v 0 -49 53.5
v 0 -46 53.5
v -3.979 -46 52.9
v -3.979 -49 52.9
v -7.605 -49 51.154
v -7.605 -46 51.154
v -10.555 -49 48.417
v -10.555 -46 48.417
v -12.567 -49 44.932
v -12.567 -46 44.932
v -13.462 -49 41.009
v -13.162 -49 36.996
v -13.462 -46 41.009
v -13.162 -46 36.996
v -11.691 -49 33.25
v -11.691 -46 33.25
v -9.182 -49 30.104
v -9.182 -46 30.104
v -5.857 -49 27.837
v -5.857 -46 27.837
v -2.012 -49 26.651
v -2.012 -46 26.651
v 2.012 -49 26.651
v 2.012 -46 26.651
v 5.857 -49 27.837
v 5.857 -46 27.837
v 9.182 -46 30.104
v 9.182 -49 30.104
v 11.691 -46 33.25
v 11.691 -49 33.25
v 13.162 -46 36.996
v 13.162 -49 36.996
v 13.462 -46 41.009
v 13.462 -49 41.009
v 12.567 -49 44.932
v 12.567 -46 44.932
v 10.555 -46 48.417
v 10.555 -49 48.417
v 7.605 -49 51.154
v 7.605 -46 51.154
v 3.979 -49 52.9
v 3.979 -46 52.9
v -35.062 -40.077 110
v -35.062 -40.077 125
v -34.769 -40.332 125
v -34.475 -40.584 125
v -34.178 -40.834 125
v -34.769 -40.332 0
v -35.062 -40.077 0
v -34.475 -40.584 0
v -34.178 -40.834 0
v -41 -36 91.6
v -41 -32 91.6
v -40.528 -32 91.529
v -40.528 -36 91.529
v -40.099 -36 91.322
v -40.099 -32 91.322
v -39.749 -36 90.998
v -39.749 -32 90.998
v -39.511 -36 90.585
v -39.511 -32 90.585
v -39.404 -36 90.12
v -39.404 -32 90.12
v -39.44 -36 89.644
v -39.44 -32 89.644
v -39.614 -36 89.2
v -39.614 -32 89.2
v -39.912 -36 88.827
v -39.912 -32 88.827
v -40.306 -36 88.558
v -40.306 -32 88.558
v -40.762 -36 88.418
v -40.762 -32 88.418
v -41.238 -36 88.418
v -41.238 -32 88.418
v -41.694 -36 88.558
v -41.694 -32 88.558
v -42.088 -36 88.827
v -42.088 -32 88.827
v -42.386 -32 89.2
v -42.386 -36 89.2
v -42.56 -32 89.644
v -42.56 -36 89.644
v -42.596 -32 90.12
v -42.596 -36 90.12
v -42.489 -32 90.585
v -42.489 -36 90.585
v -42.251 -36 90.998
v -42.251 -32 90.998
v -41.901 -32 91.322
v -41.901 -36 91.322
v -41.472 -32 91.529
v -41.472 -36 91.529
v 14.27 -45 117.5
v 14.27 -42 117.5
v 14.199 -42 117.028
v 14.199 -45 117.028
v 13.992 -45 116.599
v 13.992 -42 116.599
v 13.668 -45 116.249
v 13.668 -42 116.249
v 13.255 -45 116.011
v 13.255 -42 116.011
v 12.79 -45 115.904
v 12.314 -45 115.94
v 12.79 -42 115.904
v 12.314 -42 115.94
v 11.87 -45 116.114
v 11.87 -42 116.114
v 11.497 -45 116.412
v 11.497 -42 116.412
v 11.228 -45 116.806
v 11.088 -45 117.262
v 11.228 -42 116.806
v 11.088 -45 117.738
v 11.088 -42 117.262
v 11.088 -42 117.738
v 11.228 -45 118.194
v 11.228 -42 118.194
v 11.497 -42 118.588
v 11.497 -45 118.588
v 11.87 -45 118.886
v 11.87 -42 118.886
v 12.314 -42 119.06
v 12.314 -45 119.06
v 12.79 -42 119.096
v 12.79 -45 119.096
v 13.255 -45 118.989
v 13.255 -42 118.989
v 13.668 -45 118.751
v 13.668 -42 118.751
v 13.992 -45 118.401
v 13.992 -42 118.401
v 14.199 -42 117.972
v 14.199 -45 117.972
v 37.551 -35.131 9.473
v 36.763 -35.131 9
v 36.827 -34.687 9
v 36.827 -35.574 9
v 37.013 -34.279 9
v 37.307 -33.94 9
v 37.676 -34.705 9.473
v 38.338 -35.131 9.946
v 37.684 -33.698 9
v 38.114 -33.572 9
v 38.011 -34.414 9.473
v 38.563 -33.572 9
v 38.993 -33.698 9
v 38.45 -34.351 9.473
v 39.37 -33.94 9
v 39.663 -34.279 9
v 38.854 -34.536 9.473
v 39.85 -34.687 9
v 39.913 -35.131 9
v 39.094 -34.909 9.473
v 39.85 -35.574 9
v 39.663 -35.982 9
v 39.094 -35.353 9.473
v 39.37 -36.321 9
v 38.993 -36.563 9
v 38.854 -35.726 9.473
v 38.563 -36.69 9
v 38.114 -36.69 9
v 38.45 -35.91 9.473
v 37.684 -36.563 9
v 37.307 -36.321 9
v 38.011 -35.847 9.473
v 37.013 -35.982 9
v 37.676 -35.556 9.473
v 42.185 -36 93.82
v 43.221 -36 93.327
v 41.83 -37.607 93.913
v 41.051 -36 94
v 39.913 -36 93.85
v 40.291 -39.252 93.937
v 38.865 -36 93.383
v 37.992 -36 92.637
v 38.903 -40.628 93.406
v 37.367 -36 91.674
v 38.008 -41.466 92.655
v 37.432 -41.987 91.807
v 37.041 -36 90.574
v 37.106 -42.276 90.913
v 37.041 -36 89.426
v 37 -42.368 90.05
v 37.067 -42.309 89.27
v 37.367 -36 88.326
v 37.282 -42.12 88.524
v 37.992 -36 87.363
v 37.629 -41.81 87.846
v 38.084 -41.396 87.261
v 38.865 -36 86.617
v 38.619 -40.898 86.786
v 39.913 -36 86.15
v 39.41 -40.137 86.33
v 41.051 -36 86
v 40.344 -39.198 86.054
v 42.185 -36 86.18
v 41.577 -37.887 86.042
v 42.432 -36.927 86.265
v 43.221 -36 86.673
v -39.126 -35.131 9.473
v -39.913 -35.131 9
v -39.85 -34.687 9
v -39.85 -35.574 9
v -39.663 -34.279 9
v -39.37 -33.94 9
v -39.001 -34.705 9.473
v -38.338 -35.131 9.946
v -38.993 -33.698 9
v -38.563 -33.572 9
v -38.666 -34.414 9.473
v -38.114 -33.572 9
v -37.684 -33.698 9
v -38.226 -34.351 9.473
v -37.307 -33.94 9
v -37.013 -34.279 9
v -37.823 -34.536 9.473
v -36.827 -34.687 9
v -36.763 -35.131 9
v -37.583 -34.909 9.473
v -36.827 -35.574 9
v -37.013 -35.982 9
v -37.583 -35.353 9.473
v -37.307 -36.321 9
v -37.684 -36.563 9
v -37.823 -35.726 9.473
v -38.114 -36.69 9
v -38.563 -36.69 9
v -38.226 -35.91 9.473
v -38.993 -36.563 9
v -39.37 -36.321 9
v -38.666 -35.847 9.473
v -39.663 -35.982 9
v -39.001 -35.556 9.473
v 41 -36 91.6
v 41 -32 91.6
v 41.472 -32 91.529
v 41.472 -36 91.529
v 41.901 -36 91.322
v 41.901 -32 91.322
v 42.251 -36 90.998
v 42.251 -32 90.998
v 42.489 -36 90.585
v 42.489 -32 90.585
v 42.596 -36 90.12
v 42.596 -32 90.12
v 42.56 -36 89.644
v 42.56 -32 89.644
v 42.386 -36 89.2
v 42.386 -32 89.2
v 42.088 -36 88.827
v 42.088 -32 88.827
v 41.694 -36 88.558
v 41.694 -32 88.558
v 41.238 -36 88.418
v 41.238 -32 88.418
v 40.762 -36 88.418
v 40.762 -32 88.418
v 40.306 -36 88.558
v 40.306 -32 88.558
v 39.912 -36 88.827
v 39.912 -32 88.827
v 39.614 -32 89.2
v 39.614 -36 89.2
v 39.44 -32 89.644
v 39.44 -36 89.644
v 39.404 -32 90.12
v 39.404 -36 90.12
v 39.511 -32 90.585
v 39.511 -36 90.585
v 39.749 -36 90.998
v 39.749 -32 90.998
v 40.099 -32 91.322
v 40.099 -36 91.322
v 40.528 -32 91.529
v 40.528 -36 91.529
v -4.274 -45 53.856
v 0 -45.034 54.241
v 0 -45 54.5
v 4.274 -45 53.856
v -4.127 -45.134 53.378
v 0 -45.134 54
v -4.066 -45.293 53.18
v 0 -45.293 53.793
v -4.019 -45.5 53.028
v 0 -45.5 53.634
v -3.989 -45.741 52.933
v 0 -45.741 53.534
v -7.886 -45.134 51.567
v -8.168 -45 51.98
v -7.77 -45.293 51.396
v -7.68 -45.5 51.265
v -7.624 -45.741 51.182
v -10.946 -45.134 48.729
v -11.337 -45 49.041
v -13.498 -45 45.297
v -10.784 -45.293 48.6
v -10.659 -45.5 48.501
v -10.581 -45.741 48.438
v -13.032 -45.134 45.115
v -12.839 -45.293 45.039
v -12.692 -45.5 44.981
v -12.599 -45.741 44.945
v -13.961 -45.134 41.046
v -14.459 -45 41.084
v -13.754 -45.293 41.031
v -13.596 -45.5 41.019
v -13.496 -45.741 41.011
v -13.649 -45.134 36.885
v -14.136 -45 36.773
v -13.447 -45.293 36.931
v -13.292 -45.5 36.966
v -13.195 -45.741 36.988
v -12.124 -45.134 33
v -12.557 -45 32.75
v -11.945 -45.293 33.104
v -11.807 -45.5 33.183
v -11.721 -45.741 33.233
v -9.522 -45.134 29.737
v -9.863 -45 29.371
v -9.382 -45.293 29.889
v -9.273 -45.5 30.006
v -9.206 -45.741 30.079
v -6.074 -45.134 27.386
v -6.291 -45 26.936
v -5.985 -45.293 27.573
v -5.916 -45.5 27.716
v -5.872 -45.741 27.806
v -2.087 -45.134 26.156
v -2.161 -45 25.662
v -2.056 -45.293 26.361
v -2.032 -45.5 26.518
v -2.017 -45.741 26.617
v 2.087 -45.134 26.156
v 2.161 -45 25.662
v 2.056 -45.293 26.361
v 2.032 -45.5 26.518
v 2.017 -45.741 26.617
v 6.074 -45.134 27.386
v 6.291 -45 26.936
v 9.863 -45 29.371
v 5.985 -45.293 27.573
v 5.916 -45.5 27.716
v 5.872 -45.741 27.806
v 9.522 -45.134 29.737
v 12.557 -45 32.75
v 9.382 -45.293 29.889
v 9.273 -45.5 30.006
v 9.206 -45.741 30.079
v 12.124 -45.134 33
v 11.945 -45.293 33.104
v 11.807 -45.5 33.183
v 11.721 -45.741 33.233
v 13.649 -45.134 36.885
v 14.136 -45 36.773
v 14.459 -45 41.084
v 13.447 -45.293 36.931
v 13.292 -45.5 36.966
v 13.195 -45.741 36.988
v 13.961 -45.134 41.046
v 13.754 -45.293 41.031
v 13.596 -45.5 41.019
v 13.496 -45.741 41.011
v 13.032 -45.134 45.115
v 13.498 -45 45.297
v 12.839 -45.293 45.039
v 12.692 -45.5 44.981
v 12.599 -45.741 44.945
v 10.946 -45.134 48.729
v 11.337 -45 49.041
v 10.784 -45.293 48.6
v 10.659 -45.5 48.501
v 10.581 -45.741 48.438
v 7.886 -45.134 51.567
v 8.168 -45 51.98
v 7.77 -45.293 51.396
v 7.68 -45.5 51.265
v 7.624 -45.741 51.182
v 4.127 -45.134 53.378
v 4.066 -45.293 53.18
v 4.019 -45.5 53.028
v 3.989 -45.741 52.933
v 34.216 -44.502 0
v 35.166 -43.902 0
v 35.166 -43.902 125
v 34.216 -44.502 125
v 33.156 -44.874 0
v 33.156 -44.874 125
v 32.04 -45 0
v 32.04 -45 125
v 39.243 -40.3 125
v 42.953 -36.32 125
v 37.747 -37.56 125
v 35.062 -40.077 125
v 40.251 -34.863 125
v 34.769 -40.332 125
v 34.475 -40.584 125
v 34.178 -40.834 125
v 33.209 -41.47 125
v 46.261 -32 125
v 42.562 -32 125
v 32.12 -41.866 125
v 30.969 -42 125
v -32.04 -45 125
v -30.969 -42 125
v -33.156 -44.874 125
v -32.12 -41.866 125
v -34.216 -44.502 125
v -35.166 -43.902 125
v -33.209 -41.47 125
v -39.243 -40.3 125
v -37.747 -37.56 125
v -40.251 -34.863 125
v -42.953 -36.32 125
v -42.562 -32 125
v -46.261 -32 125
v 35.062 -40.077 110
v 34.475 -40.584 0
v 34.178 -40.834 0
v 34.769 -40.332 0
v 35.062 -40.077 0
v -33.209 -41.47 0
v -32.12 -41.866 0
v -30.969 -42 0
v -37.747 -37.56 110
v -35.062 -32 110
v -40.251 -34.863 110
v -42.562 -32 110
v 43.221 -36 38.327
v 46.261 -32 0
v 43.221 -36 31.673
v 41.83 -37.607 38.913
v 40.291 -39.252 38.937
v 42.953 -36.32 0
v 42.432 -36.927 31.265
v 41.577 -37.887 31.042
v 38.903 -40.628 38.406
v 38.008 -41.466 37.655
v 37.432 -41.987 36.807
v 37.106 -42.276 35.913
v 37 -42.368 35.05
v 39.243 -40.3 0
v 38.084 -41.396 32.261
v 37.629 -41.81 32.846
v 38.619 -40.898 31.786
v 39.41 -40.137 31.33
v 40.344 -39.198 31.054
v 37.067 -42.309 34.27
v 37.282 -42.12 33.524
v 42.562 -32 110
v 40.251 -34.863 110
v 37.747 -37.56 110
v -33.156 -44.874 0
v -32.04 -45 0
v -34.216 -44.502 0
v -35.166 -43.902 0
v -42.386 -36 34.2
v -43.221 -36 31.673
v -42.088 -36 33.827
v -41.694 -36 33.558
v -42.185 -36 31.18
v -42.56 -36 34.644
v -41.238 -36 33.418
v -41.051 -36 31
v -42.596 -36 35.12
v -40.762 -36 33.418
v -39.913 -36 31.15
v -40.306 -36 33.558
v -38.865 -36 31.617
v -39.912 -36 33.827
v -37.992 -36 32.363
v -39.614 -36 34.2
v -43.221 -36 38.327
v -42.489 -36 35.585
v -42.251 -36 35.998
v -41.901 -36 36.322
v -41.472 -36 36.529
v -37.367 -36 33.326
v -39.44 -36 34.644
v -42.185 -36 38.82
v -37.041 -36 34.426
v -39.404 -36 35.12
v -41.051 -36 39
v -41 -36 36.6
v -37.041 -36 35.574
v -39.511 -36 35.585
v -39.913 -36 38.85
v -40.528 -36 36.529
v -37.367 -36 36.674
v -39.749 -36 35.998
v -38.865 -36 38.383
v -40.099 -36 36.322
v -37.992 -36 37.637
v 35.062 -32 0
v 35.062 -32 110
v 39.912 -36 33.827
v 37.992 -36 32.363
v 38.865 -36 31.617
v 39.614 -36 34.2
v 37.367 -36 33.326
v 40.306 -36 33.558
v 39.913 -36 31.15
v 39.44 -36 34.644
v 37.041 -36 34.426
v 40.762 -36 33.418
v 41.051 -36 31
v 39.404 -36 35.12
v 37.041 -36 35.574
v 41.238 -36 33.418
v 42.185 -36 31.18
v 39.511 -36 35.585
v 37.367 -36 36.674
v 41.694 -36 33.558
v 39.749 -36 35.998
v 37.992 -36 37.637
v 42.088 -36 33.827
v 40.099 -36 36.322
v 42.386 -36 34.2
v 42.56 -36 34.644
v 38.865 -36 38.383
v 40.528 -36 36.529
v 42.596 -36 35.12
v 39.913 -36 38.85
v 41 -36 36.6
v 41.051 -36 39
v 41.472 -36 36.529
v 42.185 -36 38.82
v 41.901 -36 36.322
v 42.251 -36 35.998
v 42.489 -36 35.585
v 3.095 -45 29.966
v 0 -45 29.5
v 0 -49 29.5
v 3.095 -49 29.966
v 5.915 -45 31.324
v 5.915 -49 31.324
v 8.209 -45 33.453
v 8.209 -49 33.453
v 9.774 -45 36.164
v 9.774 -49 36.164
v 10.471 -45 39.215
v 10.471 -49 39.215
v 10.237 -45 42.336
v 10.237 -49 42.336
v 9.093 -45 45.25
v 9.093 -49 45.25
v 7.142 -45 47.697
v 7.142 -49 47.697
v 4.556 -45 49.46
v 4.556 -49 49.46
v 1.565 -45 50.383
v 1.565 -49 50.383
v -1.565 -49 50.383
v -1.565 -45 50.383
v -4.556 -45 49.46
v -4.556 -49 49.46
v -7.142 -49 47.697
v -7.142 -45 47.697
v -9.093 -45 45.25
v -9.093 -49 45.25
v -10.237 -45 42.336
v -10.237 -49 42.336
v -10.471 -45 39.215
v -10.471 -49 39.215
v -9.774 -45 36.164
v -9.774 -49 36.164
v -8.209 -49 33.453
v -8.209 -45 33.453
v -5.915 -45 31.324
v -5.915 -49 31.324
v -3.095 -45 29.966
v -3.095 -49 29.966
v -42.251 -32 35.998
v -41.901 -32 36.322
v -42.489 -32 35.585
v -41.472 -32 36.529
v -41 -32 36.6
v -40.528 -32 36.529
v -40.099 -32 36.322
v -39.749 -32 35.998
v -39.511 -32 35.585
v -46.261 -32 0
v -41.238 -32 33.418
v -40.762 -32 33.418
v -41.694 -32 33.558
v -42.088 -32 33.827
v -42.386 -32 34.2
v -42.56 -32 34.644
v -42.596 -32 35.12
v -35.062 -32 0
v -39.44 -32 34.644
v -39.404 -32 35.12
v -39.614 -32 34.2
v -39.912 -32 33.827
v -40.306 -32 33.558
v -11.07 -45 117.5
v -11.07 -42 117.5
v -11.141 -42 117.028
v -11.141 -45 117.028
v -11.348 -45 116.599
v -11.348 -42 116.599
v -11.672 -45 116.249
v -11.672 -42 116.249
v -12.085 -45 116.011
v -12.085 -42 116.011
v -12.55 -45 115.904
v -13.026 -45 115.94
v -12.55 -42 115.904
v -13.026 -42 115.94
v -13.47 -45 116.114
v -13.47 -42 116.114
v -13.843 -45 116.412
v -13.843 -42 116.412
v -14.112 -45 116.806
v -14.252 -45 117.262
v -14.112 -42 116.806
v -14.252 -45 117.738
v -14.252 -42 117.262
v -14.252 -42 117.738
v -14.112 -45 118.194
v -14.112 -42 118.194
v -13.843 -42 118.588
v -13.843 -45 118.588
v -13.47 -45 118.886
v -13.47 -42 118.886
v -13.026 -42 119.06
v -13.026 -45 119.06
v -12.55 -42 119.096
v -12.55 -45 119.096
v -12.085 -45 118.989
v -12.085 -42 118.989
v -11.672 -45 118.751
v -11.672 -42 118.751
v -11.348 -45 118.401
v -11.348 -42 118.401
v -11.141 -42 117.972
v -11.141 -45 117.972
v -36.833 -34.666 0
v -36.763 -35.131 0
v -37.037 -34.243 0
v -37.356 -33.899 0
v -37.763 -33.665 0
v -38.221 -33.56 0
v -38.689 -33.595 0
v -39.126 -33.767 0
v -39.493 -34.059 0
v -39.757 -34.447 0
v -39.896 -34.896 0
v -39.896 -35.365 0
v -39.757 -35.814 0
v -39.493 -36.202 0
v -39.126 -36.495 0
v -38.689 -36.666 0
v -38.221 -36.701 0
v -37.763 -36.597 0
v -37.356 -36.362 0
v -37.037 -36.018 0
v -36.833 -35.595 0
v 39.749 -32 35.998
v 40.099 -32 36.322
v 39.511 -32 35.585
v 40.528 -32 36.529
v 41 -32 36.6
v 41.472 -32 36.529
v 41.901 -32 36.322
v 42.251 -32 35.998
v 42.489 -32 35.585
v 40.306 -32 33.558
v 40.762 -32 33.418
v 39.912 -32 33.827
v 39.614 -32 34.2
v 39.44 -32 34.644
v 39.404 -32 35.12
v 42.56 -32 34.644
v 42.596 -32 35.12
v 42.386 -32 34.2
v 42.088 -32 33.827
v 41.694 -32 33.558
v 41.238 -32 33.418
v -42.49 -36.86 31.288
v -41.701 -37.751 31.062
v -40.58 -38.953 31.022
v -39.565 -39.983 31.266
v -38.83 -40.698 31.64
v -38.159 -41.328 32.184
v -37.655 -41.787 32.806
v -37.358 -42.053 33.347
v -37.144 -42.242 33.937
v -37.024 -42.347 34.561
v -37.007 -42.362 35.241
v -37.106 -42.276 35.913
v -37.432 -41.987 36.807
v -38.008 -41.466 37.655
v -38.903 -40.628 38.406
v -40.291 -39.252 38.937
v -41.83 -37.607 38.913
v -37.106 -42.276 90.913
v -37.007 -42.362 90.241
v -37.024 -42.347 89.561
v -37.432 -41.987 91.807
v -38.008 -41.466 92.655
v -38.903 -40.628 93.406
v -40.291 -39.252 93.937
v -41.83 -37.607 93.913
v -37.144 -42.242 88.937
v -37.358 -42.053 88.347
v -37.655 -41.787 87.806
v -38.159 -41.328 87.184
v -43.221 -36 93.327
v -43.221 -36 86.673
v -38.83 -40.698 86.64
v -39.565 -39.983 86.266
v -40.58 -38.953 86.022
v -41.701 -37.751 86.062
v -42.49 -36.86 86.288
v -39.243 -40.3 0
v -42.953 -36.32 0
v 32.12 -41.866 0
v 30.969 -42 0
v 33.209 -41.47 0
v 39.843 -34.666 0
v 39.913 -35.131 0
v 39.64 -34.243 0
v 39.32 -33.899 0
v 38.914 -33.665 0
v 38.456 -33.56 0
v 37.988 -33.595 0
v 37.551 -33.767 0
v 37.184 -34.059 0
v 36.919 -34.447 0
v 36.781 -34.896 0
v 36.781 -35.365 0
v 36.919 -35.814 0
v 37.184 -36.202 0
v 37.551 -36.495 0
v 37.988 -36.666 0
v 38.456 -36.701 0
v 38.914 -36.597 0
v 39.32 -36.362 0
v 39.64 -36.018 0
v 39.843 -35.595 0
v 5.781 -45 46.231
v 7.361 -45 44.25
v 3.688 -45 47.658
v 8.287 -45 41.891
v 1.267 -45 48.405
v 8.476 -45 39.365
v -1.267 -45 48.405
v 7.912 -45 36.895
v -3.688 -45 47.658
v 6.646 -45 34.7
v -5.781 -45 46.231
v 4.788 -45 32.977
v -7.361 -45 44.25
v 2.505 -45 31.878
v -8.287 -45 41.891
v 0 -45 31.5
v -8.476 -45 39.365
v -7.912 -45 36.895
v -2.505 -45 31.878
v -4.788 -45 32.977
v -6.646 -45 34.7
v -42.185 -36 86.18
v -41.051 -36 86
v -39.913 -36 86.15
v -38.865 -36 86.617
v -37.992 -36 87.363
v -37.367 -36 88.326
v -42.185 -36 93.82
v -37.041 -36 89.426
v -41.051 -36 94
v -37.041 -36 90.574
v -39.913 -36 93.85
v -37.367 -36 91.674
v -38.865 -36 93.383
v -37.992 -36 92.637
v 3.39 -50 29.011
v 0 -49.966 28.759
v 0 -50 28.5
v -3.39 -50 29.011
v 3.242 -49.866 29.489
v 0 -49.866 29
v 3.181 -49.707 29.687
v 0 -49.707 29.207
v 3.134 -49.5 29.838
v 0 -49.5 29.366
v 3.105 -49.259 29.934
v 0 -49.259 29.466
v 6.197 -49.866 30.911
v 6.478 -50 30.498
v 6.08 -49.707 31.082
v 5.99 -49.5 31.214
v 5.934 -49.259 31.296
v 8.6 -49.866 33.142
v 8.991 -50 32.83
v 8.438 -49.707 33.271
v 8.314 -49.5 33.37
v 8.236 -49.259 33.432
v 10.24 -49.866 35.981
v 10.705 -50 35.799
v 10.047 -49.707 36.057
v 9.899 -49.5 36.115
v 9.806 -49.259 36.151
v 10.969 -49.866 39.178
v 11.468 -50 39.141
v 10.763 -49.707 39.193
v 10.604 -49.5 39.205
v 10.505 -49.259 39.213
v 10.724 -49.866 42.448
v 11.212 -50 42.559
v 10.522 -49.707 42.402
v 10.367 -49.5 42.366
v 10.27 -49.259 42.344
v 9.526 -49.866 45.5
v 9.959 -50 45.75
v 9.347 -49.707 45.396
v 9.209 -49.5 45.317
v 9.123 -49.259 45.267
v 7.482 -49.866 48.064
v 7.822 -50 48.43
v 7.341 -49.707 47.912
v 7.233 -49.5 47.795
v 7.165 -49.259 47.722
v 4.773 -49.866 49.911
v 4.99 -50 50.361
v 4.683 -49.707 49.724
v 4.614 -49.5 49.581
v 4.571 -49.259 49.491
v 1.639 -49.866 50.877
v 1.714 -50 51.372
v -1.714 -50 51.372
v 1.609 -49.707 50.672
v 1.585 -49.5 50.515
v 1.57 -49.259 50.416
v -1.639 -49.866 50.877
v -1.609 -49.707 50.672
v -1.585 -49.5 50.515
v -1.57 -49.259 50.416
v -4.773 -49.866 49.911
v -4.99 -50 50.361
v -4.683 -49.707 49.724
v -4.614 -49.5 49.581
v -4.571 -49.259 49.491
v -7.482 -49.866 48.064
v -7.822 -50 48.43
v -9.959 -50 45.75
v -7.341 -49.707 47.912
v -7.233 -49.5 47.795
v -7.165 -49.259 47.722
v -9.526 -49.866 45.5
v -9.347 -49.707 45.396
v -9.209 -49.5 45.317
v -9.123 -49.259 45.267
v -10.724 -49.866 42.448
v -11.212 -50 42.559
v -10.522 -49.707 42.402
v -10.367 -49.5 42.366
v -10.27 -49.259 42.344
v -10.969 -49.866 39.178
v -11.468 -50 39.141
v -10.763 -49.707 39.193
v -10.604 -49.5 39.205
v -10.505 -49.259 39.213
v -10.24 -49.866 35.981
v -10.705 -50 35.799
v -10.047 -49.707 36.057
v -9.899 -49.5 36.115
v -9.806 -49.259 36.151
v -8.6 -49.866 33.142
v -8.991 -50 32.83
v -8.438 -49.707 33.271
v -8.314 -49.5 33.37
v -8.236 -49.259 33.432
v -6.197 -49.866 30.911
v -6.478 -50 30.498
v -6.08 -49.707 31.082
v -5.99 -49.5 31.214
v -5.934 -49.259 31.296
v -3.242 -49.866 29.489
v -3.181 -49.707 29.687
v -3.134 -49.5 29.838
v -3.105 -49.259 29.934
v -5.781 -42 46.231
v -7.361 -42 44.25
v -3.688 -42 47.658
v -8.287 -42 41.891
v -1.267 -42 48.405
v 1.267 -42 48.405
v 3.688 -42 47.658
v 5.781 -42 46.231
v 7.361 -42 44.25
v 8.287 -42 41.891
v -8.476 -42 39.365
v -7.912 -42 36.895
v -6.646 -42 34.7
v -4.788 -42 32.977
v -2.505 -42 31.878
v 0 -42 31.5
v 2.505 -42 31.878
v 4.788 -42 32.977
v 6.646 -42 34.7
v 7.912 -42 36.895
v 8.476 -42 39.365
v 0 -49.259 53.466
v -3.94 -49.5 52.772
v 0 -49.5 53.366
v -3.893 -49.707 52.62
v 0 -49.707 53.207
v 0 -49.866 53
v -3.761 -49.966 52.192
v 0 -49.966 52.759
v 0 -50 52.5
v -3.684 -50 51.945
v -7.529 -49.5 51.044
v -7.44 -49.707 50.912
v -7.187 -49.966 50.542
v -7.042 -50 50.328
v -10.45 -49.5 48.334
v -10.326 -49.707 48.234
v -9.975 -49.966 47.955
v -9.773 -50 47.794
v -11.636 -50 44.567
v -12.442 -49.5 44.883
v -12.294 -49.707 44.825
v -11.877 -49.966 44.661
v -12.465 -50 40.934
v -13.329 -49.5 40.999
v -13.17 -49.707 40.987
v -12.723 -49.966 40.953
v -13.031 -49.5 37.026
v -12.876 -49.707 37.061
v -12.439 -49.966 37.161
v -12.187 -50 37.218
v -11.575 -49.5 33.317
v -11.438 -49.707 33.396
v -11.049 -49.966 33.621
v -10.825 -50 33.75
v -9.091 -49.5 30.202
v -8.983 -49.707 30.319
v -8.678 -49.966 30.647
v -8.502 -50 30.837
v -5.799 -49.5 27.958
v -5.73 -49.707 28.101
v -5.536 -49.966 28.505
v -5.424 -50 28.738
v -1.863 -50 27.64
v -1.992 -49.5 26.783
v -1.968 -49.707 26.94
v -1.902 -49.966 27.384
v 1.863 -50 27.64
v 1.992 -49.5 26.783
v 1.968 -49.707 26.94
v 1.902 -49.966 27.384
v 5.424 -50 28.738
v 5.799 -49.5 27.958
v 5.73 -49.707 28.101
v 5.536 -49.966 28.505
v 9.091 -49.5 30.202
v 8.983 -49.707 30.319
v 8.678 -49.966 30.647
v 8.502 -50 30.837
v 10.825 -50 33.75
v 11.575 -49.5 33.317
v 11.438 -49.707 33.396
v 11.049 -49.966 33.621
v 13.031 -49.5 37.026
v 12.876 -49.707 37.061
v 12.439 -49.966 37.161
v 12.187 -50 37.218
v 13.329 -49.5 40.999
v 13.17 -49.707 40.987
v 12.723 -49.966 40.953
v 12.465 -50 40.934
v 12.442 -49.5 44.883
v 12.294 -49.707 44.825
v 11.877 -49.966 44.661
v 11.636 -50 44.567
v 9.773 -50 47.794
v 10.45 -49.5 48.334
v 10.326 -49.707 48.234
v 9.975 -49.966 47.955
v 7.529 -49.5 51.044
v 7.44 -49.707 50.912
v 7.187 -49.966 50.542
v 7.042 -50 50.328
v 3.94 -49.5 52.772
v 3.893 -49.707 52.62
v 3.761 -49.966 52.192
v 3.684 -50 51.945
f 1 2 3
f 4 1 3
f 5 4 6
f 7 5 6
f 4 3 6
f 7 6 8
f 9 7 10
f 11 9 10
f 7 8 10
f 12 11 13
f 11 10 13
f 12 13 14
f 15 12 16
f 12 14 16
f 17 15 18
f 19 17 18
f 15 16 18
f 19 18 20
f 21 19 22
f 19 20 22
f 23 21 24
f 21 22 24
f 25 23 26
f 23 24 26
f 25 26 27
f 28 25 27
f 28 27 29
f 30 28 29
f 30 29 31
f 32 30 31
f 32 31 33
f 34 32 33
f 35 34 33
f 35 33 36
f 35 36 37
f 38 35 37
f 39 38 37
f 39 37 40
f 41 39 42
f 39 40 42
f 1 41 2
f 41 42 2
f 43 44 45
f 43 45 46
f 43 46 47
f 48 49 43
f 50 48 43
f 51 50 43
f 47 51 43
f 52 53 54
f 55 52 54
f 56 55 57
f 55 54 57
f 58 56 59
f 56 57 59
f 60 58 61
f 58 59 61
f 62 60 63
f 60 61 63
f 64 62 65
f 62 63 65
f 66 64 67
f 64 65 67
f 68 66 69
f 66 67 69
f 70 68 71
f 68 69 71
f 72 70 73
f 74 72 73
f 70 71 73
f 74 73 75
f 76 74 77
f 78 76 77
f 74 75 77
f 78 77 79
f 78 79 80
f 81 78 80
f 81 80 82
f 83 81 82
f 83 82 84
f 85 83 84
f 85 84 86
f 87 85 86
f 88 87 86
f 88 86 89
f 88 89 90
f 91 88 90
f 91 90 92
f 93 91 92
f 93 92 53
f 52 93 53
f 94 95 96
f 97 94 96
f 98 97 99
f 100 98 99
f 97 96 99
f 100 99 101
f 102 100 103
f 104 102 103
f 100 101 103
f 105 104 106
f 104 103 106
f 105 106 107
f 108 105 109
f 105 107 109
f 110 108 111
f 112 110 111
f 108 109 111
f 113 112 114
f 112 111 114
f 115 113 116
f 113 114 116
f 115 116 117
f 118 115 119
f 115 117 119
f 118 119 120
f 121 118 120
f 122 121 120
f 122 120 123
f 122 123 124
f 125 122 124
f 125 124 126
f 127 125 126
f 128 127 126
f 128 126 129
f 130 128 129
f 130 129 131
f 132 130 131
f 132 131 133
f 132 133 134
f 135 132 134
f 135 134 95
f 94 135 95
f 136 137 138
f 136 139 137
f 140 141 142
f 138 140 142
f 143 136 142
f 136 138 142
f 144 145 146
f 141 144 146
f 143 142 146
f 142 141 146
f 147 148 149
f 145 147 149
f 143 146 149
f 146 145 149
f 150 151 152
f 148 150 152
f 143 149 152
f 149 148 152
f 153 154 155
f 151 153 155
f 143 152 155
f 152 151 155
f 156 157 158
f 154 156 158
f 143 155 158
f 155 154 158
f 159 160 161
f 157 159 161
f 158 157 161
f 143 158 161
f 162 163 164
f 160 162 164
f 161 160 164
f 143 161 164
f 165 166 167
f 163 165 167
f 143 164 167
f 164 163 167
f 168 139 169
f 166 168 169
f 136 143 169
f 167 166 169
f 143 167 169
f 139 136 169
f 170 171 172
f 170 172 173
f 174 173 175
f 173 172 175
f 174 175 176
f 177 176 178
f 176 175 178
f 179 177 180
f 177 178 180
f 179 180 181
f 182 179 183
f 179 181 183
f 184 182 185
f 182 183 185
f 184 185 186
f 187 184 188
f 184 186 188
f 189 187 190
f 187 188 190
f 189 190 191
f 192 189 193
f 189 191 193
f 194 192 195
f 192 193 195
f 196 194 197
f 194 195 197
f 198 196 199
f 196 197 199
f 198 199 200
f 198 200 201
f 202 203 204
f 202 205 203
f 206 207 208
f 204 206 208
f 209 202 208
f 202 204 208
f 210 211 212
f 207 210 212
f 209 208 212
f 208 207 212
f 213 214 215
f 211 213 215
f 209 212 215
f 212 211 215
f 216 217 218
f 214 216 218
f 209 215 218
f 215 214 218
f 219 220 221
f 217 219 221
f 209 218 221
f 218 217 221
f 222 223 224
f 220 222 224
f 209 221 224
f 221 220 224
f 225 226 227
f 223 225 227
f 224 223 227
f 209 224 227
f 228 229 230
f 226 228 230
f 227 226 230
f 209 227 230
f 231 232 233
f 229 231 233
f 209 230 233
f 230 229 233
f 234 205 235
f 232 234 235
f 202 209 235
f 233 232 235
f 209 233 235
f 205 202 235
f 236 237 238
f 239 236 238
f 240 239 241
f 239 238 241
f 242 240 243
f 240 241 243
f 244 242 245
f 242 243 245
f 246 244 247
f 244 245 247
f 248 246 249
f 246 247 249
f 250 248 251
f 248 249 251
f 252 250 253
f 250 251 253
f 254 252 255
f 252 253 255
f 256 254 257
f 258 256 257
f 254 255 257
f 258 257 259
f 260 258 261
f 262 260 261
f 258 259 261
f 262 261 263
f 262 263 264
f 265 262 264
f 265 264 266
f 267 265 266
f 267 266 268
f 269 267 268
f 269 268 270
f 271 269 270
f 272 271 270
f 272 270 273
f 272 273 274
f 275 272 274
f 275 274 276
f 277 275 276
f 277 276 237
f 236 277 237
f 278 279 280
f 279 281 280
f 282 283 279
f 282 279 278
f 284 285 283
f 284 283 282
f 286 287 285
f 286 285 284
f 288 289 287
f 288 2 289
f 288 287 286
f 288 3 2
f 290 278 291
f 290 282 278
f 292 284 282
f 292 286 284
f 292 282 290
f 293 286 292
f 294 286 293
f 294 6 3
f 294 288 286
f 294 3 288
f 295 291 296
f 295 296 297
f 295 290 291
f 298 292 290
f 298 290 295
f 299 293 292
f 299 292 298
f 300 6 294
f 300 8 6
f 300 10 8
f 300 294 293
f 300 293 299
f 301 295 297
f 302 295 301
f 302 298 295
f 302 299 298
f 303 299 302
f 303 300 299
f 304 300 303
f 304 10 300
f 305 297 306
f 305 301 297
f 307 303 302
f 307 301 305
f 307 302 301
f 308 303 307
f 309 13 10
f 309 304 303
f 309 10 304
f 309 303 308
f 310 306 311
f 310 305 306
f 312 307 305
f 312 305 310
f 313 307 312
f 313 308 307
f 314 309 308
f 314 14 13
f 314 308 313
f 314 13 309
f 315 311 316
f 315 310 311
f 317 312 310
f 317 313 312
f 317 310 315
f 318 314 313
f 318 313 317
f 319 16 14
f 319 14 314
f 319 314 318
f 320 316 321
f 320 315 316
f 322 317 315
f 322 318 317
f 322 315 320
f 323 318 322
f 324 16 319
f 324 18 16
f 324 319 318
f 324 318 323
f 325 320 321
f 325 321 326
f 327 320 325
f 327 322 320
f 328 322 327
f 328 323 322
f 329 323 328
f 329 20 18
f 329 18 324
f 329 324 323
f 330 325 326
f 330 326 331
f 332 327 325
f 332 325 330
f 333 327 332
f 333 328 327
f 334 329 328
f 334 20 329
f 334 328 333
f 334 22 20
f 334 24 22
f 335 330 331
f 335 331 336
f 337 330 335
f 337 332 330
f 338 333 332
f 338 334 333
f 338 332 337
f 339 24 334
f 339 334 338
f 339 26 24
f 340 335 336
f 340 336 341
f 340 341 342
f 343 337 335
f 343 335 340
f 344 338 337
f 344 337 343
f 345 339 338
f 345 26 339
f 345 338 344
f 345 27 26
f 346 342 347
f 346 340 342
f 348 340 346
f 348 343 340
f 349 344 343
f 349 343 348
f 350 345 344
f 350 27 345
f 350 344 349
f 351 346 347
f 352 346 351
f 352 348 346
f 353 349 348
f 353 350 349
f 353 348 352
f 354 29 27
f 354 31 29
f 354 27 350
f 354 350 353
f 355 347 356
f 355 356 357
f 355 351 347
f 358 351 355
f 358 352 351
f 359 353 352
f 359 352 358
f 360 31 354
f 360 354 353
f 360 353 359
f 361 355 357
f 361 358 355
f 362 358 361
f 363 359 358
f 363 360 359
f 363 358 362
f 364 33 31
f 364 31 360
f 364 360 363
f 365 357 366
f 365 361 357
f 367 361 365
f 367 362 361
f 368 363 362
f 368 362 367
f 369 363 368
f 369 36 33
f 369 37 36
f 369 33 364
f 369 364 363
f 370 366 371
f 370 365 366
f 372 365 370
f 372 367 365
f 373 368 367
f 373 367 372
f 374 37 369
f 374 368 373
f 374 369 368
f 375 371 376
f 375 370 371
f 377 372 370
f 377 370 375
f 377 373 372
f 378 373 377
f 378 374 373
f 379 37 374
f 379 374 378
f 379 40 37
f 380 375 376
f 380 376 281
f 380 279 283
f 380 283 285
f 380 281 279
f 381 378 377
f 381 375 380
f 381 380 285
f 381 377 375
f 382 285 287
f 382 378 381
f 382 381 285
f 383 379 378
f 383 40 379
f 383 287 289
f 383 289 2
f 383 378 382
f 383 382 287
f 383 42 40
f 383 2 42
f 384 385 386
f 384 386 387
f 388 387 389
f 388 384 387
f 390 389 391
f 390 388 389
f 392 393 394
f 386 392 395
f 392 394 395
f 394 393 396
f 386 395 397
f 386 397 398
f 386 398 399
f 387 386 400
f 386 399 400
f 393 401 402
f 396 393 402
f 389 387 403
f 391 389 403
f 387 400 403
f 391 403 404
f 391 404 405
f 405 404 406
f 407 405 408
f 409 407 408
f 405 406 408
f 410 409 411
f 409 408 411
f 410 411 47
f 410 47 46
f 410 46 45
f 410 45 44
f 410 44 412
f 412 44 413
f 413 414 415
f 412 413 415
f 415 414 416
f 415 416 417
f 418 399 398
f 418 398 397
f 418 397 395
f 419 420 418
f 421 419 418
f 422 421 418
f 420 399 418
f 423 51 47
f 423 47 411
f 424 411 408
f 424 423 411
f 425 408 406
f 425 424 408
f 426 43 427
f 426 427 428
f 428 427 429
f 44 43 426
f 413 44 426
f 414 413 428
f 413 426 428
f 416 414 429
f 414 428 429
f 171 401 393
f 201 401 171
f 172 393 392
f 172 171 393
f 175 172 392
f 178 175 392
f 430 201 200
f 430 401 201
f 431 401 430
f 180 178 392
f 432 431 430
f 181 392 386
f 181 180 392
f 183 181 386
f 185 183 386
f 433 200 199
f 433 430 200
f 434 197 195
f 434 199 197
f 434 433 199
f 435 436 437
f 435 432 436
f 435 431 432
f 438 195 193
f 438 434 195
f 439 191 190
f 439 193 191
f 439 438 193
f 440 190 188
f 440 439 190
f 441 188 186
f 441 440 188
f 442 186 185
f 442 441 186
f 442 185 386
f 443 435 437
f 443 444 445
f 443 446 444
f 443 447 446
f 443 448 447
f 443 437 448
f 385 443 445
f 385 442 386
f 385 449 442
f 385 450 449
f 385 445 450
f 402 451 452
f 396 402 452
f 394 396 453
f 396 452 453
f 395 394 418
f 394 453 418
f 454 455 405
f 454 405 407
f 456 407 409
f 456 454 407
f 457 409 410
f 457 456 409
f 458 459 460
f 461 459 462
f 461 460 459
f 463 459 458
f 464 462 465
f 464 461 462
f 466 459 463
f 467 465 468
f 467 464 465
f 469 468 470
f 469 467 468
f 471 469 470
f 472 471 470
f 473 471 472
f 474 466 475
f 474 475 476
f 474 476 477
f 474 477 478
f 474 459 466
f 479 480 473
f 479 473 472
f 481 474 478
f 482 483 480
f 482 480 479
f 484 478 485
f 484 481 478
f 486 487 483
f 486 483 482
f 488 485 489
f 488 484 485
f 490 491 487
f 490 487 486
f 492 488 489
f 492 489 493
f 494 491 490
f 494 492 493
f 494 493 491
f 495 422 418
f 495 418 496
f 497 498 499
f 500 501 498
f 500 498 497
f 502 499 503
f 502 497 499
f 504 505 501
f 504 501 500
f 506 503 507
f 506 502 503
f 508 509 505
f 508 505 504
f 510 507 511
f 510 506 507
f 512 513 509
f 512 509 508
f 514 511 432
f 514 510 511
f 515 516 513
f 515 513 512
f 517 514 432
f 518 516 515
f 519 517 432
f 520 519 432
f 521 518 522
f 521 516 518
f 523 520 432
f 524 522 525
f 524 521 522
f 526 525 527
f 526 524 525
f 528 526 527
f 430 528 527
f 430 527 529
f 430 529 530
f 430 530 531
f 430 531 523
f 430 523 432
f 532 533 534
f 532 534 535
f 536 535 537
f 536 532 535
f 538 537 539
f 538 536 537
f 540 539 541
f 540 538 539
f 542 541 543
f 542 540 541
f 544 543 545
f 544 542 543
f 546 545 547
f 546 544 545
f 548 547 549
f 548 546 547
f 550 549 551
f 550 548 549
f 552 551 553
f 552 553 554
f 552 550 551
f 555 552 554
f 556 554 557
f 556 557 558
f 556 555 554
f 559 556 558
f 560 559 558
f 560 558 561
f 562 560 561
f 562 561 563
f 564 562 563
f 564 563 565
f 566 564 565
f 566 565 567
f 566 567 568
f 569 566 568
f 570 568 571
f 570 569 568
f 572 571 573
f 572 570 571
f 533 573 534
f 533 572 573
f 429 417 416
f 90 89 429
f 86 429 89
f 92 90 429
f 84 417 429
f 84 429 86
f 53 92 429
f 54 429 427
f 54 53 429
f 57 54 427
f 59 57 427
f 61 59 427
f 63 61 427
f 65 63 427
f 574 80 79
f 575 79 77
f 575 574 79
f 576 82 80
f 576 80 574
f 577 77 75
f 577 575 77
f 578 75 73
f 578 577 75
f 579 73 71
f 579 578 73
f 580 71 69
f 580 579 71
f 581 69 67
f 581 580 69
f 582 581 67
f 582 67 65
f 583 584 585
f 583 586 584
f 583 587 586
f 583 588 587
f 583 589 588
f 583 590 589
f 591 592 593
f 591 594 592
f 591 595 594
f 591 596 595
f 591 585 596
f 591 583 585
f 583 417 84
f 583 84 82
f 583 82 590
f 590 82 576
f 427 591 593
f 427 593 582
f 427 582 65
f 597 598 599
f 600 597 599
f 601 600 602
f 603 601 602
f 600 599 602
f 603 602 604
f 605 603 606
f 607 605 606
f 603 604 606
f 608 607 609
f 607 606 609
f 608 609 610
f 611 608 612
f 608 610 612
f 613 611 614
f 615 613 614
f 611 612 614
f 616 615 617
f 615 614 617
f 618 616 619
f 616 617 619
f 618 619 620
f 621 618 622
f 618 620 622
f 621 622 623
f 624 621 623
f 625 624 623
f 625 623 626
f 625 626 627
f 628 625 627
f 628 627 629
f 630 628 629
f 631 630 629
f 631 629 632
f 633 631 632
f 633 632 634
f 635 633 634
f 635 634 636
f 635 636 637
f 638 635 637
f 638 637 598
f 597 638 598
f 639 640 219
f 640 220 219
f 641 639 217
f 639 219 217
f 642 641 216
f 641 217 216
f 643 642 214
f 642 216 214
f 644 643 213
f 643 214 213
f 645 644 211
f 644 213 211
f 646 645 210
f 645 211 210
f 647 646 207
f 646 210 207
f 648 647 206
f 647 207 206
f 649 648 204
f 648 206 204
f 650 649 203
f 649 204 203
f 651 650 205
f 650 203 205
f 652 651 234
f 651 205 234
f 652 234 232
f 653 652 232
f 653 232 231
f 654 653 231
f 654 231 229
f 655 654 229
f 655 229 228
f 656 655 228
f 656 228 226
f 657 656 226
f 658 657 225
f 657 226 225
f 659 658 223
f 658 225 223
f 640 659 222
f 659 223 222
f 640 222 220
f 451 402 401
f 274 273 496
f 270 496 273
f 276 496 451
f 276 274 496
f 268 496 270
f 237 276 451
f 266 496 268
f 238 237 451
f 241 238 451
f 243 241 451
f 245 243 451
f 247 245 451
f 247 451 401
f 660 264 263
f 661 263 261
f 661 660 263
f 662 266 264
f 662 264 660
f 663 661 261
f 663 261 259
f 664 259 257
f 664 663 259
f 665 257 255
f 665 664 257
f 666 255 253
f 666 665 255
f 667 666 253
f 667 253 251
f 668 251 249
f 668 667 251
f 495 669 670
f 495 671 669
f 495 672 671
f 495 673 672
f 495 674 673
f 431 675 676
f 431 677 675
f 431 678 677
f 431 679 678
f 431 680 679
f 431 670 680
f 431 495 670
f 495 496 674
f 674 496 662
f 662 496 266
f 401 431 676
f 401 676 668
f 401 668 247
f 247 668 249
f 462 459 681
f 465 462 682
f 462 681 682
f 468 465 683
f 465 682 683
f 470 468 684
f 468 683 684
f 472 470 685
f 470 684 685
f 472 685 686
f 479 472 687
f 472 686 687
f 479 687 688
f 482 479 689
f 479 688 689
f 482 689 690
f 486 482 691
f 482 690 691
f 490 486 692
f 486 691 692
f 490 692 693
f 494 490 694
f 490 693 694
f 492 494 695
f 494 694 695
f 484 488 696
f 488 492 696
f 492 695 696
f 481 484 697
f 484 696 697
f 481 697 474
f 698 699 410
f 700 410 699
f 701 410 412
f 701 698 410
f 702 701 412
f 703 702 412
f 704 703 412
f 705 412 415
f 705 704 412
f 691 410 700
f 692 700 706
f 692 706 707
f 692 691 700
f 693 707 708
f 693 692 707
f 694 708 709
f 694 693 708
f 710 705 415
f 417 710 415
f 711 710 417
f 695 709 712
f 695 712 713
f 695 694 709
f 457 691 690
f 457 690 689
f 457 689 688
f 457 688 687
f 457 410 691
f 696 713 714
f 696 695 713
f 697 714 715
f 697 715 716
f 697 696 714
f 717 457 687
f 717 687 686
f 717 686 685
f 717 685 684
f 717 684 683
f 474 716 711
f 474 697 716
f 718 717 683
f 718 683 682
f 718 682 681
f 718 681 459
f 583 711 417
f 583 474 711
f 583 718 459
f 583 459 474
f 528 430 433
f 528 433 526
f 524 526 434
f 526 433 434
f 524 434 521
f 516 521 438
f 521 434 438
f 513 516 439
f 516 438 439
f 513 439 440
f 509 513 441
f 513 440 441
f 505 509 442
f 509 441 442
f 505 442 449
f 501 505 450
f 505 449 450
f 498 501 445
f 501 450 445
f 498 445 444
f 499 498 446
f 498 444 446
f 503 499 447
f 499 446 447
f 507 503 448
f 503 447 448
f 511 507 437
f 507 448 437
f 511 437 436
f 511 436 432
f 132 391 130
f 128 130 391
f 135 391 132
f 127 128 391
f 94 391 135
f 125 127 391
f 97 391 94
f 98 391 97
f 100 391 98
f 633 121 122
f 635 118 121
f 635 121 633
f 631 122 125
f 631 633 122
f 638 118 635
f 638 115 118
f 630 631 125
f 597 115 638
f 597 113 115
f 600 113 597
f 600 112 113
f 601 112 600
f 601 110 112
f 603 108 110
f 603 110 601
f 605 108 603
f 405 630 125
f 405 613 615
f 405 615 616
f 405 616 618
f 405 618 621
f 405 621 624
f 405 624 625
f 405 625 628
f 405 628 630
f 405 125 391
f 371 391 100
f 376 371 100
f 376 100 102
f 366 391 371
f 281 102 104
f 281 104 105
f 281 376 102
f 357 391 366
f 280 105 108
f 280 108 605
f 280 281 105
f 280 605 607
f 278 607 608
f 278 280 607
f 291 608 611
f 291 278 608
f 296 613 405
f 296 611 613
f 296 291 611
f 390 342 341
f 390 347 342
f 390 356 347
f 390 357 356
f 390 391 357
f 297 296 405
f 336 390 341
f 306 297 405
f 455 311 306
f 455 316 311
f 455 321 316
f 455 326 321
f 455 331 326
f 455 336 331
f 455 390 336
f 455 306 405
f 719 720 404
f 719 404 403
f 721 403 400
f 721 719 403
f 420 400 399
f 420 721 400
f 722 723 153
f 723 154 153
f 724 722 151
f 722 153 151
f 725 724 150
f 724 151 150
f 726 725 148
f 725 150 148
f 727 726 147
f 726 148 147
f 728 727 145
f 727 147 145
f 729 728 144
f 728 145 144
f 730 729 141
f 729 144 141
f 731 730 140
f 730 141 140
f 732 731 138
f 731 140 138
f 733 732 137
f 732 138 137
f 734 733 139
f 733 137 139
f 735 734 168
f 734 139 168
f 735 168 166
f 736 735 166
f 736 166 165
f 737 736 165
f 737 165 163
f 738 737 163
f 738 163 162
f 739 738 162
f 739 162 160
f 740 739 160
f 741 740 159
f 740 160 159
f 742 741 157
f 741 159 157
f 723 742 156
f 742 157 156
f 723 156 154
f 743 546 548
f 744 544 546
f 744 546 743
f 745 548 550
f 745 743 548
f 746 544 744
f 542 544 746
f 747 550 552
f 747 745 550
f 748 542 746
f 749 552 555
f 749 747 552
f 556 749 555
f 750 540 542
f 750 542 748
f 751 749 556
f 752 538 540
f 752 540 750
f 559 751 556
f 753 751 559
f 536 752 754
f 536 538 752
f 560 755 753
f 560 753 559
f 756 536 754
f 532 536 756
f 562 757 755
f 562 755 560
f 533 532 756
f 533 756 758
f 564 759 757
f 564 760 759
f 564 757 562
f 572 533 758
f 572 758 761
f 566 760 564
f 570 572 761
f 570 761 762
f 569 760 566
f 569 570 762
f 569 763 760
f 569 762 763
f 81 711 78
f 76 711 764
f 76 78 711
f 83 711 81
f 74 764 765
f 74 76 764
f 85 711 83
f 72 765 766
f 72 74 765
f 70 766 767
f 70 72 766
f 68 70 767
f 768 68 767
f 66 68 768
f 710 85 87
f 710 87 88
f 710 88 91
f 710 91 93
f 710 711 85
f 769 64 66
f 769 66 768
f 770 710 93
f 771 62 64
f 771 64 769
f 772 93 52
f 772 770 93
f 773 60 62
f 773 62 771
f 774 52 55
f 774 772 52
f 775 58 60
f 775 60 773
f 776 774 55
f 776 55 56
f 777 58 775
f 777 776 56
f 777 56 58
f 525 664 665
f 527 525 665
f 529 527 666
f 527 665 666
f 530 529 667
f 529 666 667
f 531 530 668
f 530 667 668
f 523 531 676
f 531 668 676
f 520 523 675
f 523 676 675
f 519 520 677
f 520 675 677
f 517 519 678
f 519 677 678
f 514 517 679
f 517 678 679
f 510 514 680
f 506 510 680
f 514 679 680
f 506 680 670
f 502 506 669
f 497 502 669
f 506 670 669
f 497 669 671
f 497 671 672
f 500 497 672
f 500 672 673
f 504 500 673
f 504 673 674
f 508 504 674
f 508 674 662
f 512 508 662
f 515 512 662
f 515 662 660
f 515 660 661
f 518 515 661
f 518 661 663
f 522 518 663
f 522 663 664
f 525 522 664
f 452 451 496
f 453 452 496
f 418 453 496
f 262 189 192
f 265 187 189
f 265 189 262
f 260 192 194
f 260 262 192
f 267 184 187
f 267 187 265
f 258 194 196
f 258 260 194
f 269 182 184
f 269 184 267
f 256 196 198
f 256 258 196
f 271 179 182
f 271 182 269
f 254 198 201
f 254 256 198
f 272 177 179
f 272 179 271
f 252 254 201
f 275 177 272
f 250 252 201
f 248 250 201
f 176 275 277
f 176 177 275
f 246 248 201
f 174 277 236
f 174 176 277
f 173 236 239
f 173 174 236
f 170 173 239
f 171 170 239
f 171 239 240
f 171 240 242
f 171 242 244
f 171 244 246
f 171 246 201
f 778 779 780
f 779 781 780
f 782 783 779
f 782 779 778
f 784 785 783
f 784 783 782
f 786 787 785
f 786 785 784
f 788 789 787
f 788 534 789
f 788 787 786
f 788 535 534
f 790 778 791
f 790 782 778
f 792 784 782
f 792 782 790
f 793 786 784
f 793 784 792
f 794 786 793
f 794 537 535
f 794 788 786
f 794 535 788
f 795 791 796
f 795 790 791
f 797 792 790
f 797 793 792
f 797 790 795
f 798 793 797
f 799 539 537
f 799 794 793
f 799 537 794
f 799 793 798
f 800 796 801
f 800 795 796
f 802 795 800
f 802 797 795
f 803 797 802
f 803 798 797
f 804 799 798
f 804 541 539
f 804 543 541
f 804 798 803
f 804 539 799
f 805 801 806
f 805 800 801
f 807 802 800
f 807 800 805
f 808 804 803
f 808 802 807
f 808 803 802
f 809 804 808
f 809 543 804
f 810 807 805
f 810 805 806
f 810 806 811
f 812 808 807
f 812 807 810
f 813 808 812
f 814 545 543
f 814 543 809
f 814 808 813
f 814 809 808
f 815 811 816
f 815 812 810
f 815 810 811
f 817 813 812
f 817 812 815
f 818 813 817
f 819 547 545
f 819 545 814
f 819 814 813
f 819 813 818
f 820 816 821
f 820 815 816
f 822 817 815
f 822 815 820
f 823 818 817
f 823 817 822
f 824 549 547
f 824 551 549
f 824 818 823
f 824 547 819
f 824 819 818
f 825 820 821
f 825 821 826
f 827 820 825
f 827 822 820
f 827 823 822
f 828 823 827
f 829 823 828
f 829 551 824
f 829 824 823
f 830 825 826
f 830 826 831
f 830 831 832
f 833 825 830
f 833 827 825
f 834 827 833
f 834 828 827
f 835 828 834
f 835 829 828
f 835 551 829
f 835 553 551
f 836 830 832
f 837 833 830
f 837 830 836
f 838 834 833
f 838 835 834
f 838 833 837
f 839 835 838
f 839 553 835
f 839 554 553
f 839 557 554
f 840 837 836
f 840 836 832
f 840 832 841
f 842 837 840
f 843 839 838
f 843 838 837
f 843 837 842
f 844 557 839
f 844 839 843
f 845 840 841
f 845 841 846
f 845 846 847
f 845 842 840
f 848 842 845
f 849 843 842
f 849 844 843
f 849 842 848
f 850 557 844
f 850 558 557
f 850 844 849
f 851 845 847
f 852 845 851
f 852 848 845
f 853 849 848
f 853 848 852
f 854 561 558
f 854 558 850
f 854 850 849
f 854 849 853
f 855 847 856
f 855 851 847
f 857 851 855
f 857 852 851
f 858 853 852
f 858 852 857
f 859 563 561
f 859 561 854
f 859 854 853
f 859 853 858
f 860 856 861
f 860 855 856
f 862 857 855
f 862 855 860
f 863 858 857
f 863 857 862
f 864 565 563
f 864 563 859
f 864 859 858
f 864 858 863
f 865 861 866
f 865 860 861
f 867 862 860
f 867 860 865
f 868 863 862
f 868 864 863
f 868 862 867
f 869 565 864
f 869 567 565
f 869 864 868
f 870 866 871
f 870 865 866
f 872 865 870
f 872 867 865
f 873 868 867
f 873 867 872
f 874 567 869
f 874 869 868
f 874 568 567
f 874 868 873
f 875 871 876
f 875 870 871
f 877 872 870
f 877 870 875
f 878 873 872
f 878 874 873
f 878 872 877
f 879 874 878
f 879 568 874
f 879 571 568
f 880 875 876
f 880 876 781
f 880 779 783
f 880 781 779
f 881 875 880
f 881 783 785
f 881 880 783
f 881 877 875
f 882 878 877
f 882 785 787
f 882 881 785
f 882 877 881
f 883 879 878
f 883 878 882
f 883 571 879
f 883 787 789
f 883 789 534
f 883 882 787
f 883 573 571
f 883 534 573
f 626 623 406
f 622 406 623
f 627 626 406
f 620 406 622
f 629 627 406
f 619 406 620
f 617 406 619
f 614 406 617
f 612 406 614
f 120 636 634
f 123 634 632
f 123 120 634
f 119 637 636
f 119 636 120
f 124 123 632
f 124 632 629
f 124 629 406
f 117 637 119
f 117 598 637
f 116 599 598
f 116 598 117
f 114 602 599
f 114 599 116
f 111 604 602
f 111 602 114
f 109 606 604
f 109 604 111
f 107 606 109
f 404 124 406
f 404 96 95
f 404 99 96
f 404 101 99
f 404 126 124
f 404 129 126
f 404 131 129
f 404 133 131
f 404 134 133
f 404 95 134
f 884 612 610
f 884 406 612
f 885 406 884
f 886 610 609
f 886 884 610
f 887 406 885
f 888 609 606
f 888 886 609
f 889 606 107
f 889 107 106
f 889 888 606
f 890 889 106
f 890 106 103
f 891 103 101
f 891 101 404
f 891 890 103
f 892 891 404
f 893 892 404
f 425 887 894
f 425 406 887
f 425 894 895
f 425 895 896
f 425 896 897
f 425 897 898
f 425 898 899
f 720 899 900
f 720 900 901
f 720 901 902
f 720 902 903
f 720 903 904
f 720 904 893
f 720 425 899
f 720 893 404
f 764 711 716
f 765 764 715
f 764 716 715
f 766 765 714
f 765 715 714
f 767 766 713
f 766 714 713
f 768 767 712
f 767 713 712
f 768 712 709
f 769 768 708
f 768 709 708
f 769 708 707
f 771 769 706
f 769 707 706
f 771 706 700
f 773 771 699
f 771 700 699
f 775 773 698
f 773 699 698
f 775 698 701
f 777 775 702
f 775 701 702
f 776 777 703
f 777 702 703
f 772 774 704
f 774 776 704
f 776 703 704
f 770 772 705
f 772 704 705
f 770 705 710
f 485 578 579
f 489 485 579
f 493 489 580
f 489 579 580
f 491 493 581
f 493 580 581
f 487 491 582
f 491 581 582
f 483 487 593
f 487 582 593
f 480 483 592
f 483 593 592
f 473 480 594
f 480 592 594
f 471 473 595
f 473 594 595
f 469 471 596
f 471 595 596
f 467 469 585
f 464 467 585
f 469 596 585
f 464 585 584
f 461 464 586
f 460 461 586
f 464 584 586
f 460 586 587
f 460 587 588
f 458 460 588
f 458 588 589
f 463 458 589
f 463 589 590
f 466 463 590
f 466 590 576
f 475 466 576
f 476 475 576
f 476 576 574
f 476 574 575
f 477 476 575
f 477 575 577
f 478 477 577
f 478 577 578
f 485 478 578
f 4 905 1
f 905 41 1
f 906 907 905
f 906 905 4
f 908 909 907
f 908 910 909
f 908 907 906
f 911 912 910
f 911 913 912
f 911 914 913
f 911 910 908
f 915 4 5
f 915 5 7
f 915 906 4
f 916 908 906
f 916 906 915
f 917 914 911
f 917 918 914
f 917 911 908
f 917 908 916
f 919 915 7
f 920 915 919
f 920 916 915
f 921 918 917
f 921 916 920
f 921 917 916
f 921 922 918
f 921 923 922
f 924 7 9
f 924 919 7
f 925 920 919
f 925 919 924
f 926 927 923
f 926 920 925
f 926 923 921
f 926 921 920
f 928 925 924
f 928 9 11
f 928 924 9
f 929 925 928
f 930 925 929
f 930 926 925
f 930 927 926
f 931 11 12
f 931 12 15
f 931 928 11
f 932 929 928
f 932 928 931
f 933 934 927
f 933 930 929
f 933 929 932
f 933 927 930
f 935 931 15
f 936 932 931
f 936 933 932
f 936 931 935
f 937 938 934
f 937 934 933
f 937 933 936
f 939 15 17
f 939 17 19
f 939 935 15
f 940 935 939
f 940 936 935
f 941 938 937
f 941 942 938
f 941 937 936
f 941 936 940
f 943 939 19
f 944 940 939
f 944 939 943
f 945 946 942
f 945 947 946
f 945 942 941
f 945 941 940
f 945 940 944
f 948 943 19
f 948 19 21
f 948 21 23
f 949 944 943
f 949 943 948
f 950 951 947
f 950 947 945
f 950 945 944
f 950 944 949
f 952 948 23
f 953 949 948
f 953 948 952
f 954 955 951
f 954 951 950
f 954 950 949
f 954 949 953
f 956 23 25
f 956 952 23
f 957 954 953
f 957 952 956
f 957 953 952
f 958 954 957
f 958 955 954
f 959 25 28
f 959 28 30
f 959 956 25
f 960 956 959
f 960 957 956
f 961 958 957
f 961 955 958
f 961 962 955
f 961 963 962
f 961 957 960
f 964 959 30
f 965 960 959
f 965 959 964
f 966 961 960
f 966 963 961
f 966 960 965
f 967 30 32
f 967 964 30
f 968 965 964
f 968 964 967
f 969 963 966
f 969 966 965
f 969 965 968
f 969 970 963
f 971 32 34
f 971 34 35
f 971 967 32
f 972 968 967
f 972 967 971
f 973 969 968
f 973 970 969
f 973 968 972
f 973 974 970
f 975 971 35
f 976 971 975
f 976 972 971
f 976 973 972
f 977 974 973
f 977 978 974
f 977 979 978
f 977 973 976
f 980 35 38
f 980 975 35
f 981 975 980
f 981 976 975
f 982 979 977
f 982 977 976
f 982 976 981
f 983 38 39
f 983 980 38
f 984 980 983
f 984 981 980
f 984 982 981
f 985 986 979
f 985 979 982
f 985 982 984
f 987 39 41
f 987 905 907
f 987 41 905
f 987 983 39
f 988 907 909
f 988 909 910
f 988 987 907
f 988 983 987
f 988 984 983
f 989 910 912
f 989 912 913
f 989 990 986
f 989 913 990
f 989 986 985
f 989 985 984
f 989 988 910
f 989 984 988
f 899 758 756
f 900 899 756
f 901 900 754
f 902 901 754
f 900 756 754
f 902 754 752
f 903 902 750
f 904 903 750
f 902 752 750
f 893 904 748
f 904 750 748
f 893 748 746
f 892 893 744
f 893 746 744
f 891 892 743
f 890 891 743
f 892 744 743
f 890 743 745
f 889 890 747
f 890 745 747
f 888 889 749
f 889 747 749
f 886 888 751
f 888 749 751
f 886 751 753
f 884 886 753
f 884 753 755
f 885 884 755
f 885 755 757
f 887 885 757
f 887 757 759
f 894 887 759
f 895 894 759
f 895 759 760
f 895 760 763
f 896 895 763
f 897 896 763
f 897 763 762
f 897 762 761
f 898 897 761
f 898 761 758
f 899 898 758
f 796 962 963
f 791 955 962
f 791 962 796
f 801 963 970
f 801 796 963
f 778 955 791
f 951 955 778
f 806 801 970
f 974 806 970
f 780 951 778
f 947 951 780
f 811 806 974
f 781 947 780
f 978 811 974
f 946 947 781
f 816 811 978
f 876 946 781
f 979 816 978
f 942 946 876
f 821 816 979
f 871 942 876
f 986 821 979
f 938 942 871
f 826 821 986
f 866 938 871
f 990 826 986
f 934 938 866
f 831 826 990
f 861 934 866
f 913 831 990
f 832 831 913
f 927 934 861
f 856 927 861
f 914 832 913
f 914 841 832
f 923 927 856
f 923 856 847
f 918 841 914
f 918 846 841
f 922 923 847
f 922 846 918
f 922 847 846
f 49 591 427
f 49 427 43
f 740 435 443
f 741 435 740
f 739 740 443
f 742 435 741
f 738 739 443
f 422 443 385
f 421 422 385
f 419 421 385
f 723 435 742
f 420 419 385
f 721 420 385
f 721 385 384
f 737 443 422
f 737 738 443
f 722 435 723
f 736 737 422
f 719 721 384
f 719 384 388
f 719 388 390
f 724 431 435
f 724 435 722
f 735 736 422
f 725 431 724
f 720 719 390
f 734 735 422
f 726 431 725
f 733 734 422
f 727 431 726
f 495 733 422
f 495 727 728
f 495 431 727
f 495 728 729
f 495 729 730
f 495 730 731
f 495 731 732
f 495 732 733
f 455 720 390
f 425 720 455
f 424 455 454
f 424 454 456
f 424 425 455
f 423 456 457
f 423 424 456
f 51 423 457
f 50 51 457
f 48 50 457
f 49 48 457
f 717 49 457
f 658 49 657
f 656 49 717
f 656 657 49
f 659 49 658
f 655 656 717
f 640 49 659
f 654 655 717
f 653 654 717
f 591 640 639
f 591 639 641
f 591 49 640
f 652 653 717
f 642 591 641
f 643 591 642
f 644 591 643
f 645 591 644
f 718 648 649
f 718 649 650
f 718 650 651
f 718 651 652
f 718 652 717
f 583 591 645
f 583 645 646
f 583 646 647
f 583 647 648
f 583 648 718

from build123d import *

# Parameters (mm, degrees)
Y_KSEKLIK_EKSTR_ZYON1_DEPTH             = 125
KES_EKSTR_ZYON1_START                   = -15
KES_EKSTR_ZYON1_DEPTH                   = 15
M3_BO_LUKLU_DELIK1_D                    = 3.2
M3_BO_LUKLU_DELIK1_DEPTH                = 11.5
M3_BO_LUKLU_DELIK1_TIP                  = 0.96137699
IZIM8_R                                 = 4
KES_EKSTR_ZYON2_DEPTH                   = 9
M3_BO_LUKLU_DELIK2_D                    = 3.2
M3_BO_LUKLU_DELIK2_DEPTH                = 11.5
M3_BO_LUKLU_DELIK2_TIP                  = 0.96137699
M3X0_5_HELISARMAL_IN_DI_LI_DELIK1_D     = 3.15
M3X0_5_HELISARMAL_IN_DI_LI_DELIK1_DEPTH = 9
M3X0_5_HELISARMAL_IN_DI_LI_DELIK1_TIP   = 0.946355475
IZIM13_R                                = 8.5
KES_EKSTR_ZYON3_DEPTH                   = 10
IZIM14_R                                = 13.5
IZIM14_R_2                              = 10.5
Y_KSEKLIK_EKSTR_ZYON2_DEPTH             = 5
RADYUS1_R                               = 1


with BuildPart() as part:
    # Çizim1 → Yükseklik-Ekstrüzyon1 (new body)
    with BuildSketch(Plane.XY):
        with BuildLine():
            ThreePointArc((-32.040014045, -45), (-33.696486936, -44.717636862), (-35.165869074, -43.902439024))
            ThreePointArc((-35.165869074, -43.902439024), (-41.1459963, -38.354523703), (-46.260809548, -32))
            Line((-46.260809548, -32), (-42.562454112, -32))
            Line((-42.562454112, -32), (-35.062454112, -32))
            Line((-35.062454112, -32), (-35.062454112, -40.077260531))
            ThreePointArc((-35.062454112, -40.077260531), (-34.622260448, -40.458146046), (-34.17792949, -40.834196891))
            ThreePointArc((-34.17792949, -40.834196891), (-32.675927184, -41.699520425), (-30.968734233, -42))
            Line((-30.968734233, -42), (30.968734233, -42))
            ThreePointArc((30.968734233, -42), (32.675927184, -41.699520425), (34.17792949, -40.834196891))
            ThreePointArc((34.17792949, -40.834196891), (34.622260448, -40.458146046), (35.062454112, -40.077260531))
            Line((35.062454112, -40.077260531), (35.062454112, -32))
            Line((35.062454112, -32), (42.562454112, -32))
            Line((42.562454112, -32), (46.260809548, -32))
            ThreePointArc((46.260809548, -32), (41.1459963, -38.354523703), (35.165869074, -43.902439024))
            ThreePointArc((35.165869074, -43.902439024), (33.696486936, -44.717636862), (32.040014045, -45))
            Line((32.040014045, -45), (-32.040014045, -45))
        make_face()
    extrude(amount=Y_KSEKLIK_EKSTR_ZYON1_DEPTH)

    # Çizim2 → Kes-Ekstrüzyon1 (cut)
    with BuildSketch(Plane.XY.offset(125).offset(KES_EKSTR_ZYON1_START)):
        with BuildLine():
            Line((30.968734233, -42), (-30.968734233, -42))
            ThreePointArc((-30.968734233, -42), (-32.675927184, -41.699520425), (-34.17792949, -40.834196891))
            ThreePointArc((-34.17792949, -40.834196891), (0, 53.25), (34.17792949, -40.834196891))
            ThreePointArc((34.17792949, -40.834196891), (32.675927184, -41.699520425), (30.968734233, -42))
        make_face()
    extrude(amount=KES_EKSTR_ZYON1_DEPTH, mode=Mode.SUBTRACT)

    # M3 Boşluklu Delik1
    with Locations(Plane(origin=(0, -45, 0), x_dir=(-1, 0, 0), z_dir=(0, -1, 0))):
        with Locations((-12.67, -117.5), (12.67, -117.5)):
            Hole(M3_BO_LUKLU_DELIK1_D / 2, depth=M3_BO_LUKLU_DELIK1_DEPTH)
            with Locations((0, 0, -(M3_BO_LUKLU_DELIK1_DEPTH + M3_BO_LUKLU_DELIK1_TIP / 2))):  # 118° drill point
                Cone(0, M3_BO_LUKLU_DELIK1_D / 2, M3_BO_LUKLU_DELIK1_TIP, mode=Mode.SUBTRACT)

    # Çizim8 → Kes-Ekstrüzyon2 (cut)
    with BuildSketch(Plane.XZ.offset(45)):
        with Locations((-41, 90)):
            Circle(IZIM8_R)
        with Locations((41, 90)):
            Circle(IZIM8_R)
        with Locations((-41, 35)):
            Circle(IZIM8_R)
        with Locations((41, 35)):
            Circle(IZIM8_R)
    extrude(amount=-KES_EKSTR_ZYON2_DEPTH, mode=Mode.SUBTRACT)

    # M3 Boşluklu Delik2
    with Locations(Plane(origin=(-41, -36, 90), x_dir=(0, 0, -1), z_dir=(0, -1, 0))):
        with Locations((0, 0), (55, 0), (0, 82), (55, 82)):
            Hole(M3_BO_LUKLU_DELIK2_D / 2, depth=M3_BO_LUKLU_DELIK2_DEPTH)
            with Locations((0, 0, -(M3_BO_LUKLU_DELIK2_DEPTH + M3_BO_LUKLU_DELIK2_TIP / 2))):  # 118° drill point
                Cone(0, M3_BO_LUKLU_DELIK2_D / 2, M3_BO_LUKLU_DELIK2_TIP, mode=Mode.SUBTRACT)

    # M3x0.5 Helisarmal İçin Dişli Delik1
    with Locations(Plane(origin=(0, 0, 0), x_dir=(-1, 0, 0), z_dir=(0, 0, -1))):
        with Locations((38.338421514, -35.130690796), (-38.338421514, -35.130690796)):
            Hole(M3X0_5_HELISARMAL_IN_DI_LI_DELIK1_D / 2, depth=M3X0_5_HELISARMAL_IN_DI_LI_DELIK1_DEPTH)
            with Locations((0, 0, -(M3X0_5_HELISARMAL_IN_DI_LI_DELIK1_DEPTH + M3X0_5_HELISARMAL_IN_DI_LI_DELIK1_TIP / 2))):  # 118° drill point
                Cone(0, M3X0_5_HELISARMAL_IN_DI_LI_DELIK1_D / 2, M3X0_5_HELISARMAL_IN_DI_LI_DELIK1_TIP, mode=Mode.SUBTRACT)

    # Çizim13 → Kes-Ekstrüzyon3 (cut)
    with BuildSketch(Plane.XZ.offset(45)):
        with Locations(Location((0, 40, 0), (0, 0, 270))):
            Circle(IZIM13_R)
    extrude(amount=-KES_EKSTR_ZYON3_DEPTH, mode=Mode.SUBTRACT)

    # Çizim14 → Yükseklik-Ekstrüzyon2 (add)
    with BuildSketch(Plane.XZ.offset(45)):
        with Locations(Location((0, 40, 0), (0, 0, 90))):
            Circle(IZIM14_R)
        with Locations(Location((0, 40, 0), (0, 0, 270))):
            Circle(IZIM14_R_2, mode=Mode.SUBTRACT)
    extrude(amount=Y_KSEKLIK_EKSTR_ZYON2_DEPTH)

    # Radyus1
    radyus1_edges = [part.edges().sort_by_distance(p)[0] for p in [
        (0, -45, 26.5),
        (0, -50, 26.5),
        (0, -50, 50.5),
    ]]
    fillet(radyus1_edges, radius=RADYUS1_R)


solid = part.part
